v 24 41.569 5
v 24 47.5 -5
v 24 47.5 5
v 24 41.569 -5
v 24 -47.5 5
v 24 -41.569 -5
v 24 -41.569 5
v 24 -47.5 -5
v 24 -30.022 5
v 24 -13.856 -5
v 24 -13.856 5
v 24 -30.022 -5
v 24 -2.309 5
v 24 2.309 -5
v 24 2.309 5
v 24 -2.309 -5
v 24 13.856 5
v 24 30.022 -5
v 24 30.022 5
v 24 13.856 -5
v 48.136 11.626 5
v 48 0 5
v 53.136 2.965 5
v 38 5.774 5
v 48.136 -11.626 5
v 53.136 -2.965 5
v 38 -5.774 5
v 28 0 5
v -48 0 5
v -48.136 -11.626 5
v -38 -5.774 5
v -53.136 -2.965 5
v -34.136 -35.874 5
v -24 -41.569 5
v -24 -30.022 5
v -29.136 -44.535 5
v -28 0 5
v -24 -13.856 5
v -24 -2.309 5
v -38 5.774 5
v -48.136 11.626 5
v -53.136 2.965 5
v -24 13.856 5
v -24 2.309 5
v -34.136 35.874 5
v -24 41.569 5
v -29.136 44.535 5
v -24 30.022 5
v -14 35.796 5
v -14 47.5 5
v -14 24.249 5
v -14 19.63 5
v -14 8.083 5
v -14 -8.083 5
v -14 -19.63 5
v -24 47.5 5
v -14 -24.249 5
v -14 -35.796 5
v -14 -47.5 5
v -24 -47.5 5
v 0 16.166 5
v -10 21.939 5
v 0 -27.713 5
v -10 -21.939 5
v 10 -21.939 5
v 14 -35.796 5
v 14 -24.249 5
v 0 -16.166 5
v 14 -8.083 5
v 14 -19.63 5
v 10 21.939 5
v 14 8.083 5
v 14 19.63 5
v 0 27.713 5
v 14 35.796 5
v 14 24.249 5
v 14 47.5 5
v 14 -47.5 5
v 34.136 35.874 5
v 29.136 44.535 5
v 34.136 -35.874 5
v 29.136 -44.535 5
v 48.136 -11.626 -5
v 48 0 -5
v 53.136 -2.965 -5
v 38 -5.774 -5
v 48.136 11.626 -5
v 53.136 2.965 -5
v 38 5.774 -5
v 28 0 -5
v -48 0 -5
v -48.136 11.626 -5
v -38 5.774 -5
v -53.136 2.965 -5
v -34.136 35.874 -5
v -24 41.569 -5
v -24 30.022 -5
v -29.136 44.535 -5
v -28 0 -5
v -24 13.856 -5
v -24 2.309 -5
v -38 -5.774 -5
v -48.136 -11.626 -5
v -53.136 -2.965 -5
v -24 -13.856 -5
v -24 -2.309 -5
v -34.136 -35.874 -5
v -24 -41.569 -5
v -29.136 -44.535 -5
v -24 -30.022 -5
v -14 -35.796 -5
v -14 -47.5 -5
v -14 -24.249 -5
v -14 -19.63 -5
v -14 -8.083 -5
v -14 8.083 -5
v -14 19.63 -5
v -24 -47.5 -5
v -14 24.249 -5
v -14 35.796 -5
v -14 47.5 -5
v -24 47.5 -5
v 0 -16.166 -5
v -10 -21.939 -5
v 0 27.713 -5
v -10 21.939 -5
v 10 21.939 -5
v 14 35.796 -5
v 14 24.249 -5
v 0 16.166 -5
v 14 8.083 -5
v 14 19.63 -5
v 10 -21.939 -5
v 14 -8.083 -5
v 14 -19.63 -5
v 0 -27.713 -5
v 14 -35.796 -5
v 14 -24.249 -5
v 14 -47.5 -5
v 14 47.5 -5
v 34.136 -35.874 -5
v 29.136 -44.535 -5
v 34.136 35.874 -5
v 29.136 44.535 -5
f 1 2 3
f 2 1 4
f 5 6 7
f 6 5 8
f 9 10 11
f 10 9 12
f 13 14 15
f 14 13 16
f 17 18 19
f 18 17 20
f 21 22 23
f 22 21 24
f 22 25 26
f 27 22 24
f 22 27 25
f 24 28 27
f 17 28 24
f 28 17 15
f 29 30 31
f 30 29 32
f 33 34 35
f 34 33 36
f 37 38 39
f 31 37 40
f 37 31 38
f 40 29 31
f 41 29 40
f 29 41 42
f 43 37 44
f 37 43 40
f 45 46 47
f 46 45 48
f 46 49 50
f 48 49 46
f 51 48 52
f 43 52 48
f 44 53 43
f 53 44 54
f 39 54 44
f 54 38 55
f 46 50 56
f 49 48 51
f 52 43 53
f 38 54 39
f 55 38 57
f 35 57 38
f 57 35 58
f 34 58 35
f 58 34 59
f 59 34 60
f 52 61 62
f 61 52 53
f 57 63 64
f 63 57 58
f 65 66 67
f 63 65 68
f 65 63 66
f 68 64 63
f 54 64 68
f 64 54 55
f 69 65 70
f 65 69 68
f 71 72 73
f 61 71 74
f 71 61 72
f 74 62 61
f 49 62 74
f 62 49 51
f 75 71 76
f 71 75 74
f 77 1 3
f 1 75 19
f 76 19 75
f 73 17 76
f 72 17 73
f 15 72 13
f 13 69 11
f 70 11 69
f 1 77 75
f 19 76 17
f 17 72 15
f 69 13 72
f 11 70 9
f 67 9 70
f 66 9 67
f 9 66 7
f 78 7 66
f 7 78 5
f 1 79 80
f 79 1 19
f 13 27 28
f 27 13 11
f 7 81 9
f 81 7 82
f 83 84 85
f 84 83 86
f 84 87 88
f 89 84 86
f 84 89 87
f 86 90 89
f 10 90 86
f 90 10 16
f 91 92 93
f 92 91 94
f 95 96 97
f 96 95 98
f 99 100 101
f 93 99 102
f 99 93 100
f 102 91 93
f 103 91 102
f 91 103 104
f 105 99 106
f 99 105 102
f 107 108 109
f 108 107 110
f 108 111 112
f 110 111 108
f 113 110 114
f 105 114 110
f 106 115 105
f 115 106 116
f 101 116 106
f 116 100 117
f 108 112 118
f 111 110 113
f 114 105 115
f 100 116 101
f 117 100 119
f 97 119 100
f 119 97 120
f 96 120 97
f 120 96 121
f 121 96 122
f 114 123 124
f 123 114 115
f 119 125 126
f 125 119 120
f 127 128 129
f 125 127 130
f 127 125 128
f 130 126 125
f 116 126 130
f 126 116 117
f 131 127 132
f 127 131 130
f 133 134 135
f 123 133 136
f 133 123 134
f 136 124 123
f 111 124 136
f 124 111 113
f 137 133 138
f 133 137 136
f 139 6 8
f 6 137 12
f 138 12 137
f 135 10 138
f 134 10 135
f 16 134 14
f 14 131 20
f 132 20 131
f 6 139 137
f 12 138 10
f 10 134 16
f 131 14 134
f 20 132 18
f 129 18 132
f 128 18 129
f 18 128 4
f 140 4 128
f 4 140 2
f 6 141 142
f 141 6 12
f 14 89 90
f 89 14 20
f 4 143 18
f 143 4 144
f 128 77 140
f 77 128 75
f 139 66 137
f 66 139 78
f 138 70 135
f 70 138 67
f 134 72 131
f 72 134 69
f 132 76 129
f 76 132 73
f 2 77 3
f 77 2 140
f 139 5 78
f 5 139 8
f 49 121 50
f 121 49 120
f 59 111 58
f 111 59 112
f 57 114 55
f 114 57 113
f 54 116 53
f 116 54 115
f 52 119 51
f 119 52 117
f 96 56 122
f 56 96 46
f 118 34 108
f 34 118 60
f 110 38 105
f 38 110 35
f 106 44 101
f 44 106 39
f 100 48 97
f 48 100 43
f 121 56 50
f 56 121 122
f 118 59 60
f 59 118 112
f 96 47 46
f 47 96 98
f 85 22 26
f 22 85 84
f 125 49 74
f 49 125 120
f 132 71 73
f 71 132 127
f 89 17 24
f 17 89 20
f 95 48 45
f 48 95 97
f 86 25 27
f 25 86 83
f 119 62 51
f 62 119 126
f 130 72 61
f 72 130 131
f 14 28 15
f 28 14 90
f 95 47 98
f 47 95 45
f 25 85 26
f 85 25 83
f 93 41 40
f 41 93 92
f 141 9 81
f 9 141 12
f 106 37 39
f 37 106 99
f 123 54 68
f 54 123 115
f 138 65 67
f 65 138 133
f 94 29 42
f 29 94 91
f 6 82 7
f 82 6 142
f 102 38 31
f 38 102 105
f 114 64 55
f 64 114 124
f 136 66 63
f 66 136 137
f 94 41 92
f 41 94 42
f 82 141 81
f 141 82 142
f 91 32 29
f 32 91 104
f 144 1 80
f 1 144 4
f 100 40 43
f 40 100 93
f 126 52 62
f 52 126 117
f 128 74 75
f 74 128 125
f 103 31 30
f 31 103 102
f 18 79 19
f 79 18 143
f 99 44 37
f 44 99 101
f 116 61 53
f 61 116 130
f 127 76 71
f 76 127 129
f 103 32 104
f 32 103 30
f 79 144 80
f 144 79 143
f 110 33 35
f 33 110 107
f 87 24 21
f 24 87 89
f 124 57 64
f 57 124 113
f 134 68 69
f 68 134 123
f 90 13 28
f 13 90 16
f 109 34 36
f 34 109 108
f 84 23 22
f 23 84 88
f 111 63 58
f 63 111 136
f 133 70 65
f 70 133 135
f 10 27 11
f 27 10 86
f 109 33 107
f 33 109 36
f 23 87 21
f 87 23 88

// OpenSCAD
width = 10;
length = 95;
t = 19;

rotate([0, 0, 0]) {
    color("navy", .3) translate([t, 0, 0]) cube([width, length, width], center=true);
    color("blue", .3) translate([-t, 0, 0]) cube([width, length, width], center=true);
}
rotate([0, 0, 60]) {
    color("darkred", .3) translate([t, 0, 0]) cube([width, length, width], center=true);
    color("red", .3) translate([-t, 0, 0]) cube([width, length, width], center=true);
}
rotate([0, 0, 120]) {
    color("darkgreen", .3) translate([t, 0, 0]) cube([width, length, width], center=true);
    color("green", .3) translate([-t, 0, 0]) cube([width, length, width], center=true);
}
